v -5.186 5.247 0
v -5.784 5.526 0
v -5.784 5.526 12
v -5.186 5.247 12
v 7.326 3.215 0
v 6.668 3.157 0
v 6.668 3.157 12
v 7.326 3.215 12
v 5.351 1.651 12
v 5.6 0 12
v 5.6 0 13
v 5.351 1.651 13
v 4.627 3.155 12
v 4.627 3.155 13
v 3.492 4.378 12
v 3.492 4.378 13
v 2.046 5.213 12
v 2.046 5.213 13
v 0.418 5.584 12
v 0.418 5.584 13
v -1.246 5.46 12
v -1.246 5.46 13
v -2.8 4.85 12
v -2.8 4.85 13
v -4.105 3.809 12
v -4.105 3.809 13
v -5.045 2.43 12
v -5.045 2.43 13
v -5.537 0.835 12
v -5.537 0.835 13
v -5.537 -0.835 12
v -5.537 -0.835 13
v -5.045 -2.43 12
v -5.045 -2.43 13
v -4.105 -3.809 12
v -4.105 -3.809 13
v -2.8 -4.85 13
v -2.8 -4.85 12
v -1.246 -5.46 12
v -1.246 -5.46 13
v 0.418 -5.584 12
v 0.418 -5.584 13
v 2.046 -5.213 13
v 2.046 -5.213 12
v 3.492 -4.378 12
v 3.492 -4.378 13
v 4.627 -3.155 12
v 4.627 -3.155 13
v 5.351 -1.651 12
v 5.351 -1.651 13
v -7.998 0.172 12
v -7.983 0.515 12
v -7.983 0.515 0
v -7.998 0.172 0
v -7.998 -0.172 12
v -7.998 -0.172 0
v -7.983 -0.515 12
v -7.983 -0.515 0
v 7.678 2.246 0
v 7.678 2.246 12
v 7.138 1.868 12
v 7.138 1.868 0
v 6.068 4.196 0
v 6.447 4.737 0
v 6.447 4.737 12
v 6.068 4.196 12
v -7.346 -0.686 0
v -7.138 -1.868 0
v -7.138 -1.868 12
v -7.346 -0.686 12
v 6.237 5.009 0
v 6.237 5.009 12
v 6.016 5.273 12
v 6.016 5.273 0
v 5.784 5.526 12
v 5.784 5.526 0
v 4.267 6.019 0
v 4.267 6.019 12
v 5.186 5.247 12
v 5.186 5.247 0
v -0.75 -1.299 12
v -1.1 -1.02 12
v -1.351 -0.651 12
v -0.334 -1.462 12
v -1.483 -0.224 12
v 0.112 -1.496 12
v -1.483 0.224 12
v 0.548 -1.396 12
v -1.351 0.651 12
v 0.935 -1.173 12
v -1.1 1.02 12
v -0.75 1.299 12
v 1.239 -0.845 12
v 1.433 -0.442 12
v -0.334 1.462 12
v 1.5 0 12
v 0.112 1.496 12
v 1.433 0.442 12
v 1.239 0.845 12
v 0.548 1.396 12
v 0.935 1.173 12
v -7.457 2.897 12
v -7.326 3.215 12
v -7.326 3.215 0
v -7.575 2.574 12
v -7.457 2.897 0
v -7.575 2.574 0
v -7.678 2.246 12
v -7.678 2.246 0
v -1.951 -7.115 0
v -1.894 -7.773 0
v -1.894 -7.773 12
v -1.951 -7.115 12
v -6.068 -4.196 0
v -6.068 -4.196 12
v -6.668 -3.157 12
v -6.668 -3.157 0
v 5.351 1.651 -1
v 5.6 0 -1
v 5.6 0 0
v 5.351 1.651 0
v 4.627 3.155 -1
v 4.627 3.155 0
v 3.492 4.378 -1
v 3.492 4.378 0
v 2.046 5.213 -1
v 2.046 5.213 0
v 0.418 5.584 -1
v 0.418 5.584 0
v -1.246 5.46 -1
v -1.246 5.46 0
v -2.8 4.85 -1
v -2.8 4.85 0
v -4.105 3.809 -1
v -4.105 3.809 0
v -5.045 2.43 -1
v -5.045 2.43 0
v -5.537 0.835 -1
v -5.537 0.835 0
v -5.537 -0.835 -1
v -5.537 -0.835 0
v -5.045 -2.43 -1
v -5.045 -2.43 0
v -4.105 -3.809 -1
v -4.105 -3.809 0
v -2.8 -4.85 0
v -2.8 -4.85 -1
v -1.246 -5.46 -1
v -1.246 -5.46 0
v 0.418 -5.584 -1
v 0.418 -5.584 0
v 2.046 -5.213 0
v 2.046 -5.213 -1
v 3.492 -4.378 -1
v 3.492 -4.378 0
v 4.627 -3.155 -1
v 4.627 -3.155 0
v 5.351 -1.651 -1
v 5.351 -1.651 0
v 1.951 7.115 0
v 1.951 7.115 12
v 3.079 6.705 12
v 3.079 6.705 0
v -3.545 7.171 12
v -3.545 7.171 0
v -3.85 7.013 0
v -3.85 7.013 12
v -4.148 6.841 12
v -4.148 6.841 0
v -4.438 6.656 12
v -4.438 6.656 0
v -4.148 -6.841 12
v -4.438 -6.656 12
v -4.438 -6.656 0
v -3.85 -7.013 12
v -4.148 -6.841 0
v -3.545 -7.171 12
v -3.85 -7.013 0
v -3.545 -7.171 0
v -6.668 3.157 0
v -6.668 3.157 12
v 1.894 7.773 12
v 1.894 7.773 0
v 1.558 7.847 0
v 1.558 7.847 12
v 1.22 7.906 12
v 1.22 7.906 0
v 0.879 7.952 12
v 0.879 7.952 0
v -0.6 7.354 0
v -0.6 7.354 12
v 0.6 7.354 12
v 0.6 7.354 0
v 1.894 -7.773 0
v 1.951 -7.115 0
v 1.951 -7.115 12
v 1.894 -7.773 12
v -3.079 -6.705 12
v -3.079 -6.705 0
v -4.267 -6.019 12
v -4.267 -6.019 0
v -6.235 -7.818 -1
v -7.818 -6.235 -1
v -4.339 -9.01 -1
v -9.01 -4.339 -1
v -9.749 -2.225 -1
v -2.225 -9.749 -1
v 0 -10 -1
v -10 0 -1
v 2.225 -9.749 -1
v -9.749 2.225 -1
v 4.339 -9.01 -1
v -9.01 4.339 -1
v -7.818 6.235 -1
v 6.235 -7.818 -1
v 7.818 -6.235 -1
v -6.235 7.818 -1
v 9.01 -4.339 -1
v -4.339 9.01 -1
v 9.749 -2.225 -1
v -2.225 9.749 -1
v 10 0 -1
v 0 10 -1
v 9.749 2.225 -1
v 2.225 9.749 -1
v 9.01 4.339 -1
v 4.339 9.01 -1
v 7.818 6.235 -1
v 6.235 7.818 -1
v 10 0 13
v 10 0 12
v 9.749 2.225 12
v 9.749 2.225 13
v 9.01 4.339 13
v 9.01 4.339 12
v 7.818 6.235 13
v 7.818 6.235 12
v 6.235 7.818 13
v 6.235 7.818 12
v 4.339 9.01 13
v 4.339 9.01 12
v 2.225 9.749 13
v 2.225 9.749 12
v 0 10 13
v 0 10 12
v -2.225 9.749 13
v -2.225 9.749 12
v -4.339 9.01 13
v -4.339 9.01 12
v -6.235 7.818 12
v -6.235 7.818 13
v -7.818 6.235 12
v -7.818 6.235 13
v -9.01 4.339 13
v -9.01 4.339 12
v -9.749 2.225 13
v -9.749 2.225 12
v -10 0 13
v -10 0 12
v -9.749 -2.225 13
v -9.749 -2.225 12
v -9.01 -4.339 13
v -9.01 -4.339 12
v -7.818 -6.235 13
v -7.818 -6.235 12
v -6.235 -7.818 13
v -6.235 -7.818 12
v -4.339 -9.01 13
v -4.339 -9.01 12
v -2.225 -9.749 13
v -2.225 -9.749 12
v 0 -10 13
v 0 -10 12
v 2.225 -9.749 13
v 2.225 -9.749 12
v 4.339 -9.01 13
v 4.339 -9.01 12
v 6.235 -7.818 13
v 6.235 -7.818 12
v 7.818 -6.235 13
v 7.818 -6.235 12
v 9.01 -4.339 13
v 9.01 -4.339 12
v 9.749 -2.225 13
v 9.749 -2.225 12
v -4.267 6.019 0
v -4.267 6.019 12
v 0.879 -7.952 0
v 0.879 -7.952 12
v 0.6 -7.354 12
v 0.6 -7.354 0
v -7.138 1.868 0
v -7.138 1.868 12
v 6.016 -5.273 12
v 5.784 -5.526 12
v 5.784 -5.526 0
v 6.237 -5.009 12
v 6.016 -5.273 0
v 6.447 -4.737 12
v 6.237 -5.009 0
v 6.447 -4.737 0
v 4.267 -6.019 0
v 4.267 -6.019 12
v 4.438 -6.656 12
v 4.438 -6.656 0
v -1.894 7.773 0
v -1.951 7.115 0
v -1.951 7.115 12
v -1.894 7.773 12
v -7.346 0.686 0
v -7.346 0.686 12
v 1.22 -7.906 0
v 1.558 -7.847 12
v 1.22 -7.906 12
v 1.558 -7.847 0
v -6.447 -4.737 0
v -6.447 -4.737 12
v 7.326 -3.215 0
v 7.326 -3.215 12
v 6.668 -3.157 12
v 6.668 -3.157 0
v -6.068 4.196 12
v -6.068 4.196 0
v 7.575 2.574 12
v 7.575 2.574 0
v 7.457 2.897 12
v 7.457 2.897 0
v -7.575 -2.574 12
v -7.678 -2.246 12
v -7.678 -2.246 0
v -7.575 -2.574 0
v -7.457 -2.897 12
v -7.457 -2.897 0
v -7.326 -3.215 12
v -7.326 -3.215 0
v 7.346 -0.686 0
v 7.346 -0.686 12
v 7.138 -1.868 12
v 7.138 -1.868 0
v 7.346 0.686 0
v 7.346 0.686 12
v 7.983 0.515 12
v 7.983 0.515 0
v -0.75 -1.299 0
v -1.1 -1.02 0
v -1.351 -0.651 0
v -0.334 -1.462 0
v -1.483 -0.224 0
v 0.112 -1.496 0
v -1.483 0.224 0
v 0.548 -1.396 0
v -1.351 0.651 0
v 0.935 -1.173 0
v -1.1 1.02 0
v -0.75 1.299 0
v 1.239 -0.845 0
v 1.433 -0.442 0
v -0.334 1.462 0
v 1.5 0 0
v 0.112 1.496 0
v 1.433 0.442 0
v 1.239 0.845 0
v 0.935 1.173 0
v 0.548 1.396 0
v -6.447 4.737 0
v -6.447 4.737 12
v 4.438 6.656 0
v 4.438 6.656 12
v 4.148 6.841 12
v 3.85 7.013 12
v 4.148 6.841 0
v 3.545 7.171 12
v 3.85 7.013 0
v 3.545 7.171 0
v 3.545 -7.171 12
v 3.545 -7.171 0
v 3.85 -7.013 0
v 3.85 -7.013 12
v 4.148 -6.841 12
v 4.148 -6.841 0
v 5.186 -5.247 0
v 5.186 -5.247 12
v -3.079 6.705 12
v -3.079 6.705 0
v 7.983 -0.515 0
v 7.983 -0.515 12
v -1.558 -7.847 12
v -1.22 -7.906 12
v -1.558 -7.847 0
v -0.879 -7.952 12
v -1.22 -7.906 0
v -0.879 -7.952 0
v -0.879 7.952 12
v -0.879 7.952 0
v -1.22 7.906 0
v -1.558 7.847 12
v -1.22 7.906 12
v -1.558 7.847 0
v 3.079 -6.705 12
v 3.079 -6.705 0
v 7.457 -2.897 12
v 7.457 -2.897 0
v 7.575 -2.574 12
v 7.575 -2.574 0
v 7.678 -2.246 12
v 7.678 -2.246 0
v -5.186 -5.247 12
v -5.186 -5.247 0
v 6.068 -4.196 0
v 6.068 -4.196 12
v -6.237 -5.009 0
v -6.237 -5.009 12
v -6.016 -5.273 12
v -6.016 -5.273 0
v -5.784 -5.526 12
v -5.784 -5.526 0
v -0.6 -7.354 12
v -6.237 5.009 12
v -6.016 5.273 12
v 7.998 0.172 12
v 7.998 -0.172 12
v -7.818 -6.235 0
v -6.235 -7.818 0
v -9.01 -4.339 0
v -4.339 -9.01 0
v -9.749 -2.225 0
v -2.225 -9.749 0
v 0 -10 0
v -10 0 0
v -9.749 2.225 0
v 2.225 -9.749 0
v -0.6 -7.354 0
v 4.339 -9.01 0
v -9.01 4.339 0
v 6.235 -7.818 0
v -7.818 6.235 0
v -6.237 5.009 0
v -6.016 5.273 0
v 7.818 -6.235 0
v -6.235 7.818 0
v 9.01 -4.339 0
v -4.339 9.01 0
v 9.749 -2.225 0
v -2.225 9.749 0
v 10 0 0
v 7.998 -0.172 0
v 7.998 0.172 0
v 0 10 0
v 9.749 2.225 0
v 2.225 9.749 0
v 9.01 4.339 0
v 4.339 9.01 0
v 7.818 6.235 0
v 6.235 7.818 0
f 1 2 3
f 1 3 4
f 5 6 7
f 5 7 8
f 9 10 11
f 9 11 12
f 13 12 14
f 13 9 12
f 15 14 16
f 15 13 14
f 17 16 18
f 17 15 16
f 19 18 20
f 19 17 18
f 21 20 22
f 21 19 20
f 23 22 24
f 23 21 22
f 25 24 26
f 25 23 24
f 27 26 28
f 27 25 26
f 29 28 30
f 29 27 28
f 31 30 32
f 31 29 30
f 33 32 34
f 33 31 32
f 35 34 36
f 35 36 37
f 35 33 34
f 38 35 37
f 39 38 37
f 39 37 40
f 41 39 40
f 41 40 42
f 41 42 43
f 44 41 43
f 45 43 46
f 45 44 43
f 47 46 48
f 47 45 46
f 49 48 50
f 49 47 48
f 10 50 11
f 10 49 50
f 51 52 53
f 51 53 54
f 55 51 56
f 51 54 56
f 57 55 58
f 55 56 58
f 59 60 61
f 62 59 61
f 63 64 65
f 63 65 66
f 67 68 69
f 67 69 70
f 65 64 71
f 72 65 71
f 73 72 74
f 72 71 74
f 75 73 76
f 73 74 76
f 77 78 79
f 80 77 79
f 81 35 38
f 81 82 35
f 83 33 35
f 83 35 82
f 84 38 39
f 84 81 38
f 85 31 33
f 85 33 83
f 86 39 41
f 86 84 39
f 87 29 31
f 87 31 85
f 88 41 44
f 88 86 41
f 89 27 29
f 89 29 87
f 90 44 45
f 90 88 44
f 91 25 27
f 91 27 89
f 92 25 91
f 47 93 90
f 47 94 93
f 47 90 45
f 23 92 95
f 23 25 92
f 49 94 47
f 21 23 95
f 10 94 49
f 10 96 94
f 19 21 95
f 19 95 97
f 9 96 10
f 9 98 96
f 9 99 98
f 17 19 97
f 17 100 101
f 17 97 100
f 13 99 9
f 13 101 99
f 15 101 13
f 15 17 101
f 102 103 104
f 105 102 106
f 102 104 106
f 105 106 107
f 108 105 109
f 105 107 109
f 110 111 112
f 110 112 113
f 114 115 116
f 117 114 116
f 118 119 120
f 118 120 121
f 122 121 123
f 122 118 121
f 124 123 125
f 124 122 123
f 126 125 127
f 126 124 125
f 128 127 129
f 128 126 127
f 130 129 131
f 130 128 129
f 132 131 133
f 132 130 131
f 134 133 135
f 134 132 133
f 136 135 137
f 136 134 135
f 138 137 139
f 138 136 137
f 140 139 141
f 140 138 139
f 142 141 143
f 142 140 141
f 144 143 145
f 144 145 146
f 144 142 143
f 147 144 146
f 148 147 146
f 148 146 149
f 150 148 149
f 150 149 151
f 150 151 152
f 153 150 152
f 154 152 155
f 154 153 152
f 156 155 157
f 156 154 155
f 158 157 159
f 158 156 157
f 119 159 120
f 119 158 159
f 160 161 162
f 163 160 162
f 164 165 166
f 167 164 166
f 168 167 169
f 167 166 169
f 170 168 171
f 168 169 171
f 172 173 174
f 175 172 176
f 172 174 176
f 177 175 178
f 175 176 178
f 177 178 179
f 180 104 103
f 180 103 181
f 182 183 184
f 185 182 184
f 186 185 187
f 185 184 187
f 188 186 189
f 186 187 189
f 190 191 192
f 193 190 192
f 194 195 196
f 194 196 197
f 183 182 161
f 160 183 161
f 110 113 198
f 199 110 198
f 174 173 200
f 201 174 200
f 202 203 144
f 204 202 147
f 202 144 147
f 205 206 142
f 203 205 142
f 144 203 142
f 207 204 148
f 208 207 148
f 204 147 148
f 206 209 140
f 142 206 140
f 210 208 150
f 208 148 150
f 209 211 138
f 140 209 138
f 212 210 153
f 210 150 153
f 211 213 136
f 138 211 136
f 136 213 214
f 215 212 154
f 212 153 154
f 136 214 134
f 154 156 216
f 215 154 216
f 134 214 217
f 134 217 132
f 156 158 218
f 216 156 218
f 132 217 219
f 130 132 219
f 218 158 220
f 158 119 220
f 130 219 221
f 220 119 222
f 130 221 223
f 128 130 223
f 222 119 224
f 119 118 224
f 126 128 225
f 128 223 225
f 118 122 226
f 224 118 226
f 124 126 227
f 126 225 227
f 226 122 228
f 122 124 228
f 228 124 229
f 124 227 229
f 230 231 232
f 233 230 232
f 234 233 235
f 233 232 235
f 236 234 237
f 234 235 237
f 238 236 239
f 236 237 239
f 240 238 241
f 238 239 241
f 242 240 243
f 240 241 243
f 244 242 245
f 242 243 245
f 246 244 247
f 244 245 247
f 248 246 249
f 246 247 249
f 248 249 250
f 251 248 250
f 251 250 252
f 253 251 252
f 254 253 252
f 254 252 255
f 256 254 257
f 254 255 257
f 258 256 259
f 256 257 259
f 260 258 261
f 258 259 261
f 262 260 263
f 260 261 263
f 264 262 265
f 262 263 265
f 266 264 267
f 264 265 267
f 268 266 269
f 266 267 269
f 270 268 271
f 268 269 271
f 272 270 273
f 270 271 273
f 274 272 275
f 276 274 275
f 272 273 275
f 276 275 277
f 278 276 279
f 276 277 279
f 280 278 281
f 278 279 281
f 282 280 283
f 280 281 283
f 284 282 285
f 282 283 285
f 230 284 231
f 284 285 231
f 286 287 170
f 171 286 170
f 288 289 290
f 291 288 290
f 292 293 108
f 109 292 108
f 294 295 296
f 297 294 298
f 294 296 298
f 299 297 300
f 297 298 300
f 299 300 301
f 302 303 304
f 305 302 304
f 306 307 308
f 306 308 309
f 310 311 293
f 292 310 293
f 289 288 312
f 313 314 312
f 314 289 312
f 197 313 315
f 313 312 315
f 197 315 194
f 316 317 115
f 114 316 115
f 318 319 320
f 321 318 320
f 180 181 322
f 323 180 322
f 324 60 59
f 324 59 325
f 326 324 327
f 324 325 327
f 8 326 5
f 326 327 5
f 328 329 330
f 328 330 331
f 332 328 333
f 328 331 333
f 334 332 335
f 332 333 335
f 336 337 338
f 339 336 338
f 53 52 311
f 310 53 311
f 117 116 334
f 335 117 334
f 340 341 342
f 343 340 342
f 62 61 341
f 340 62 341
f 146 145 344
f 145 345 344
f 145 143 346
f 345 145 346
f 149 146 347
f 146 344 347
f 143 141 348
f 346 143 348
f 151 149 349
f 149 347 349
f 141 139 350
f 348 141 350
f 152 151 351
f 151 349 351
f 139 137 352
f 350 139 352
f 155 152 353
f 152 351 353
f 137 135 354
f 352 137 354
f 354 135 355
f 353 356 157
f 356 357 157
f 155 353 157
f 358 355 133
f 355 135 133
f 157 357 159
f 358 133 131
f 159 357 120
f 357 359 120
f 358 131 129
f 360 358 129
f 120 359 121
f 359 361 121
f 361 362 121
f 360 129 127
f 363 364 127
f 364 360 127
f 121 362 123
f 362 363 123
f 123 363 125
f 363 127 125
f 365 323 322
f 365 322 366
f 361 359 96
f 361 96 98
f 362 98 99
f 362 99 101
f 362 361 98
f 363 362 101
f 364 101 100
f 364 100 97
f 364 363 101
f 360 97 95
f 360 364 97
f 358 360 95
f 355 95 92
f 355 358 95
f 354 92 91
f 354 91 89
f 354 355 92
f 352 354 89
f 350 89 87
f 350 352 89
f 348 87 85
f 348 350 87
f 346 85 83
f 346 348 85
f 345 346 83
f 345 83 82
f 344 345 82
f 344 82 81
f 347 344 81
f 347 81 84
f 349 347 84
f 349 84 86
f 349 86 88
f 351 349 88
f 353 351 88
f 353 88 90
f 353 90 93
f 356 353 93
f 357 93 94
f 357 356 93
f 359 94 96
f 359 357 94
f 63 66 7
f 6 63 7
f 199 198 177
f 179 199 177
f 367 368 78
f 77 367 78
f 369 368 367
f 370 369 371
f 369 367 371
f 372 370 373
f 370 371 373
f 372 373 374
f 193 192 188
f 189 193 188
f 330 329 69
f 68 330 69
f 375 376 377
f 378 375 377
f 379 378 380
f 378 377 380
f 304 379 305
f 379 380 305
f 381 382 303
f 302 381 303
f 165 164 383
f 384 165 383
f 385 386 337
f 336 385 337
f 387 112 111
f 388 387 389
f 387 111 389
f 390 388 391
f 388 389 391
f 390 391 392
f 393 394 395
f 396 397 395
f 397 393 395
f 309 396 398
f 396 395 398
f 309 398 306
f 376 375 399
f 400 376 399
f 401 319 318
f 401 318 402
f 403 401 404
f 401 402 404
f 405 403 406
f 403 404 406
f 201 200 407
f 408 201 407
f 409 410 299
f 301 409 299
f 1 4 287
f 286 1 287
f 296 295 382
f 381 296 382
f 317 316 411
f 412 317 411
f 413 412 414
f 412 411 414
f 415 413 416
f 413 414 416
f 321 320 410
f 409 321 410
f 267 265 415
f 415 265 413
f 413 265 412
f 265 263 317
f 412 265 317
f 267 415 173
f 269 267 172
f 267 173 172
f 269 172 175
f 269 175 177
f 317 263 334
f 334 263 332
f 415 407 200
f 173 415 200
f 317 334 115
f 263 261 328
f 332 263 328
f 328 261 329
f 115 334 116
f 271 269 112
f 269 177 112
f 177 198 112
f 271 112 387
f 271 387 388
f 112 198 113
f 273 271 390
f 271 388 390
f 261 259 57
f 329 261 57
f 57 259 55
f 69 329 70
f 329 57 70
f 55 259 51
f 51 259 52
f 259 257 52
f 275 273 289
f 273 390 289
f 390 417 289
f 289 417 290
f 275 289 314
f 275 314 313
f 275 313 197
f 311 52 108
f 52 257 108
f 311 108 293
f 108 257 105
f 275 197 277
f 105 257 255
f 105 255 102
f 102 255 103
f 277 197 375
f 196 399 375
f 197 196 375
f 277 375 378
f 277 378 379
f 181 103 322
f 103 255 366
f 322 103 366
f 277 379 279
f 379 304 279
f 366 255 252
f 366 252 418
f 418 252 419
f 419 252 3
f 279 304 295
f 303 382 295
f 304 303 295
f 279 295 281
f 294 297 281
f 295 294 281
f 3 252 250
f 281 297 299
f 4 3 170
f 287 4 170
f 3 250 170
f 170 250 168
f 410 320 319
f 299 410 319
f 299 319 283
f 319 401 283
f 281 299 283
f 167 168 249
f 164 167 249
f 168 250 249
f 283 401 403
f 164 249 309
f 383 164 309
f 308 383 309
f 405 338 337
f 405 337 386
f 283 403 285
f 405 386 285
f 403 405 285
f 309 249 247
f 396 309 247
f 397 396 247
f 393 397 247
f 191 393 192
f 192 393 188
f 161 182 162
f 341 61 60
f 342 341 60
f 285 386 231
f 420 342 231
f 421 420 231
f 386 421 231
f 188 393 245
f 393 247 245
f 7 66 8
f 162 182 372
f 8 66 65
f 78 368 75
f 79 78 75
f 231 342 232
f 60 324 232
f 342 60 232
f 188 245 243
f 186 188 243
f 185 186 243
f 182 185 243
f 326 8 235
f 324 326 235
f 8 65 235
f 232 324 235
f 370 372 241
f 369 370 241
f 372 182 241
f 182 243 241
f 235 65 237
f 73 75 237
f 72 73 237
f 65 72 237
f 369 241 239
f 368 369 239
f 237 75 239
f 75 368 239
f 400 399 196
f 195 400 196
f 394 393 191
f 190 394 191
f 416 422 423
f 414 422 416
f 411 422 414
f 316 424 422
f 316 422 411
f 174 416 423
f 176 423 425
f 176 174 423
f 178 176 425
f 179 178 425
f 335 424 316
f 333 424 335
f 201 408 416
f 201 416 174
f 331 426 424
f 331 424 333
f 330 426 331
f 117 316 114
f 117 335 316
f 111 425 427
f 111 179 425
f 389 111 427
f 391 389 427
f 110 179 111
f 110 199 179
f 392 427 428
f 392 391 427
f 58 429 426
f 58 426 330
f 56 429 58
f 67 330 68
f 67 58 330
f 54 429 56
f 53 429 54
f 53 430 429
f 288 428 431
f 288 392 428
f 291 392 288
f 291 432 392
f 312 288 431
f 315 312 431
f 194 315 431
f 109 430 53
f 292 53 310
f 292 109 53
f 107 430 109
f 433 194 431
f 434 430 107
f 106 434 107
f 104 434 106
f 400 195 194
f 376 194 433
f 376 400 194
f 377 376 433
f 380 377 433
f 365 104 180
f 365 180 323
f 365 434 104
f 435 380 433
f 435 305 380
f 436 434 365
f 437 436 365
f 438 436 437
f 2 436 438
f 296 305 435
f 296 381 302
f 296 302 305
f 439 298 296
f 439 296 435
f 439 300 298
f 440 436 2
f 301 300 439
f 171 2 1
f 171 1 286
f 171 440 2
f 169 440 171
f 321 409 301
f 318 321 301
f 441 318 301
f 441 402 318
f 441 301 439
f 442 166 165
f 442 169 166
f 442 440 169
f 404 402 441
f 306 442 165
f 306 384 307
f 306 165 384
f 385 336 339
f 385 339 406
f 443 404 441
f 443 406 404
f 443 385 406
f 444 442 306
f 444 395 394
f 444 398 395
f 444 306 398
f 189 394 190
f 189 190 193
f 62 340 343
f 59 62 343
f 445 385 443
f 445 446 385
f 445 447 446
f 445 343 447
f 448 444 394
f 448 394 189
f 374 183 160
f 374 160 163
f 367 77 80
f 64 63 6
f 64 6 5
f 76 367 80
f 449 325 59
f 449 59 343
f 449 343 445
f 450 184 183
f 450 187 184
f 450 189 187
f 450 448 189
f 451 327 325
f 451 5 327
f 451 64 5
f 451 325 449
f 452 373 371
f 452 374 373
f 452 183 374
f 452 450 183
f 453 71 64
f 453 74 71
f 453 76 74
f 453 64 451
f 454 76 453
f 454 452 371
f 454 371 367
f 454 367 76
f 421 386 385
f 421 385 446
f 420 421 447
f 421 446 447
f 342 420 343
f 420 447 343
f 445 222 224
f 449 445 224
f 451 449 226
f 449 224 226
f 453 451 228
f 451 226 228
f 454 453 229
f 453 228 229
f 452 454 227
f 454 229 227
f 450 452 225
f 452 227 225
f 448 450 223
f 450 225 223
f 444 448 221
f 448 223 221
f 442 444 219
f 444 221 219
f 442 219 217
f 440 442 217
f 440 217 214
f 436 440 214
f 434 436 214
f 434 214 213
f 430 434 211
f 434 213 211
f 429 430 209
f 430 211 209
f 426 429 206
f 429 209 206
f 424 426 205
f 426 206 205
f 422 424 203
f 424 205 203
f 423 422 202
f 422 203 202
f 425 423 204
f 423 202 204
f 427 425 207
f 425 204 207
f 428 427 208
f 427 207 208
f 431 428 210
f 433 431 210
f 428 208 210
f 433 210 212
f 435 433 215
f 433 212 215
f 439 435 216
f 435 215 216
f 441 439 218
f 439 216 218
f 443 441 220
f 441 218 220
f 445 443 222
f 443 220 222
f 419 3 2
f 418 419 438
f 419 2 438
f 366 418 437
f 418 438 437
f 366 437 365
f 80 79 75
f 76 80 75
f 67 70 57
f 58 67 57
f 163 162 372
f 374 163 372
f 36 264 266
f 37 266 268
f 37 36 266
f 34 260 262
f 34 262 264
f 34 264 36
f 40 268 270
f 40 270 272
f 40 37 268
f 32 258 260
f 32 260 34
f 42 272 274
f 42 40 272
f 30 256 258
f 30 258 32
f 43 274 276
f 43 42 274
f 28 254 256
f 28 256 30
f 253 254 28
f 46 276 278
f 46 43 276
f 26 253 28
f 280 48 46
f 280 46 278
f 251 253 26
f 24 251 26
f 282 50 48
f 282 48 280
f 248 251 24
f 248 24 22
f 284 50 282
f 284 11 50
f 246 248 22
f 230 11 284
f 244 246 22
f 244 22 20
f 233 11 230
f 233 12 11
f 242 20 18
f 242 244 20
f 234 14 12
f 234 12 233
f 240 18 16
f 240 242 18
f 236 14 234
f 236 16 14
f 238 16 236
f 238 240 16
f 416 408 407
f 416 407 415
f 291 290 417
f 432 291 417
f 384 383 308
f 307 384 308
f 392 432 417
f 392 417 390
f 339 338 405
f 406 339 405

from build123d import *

# Parameters (mm, degrees)
ESQUISSE1_R                  = 8
ESQUISSE1_R_2                = 1.5
EXTRUSION1_DEPTH             = 12
EXTRUSION2_DEPTH             = 17.492422502
R_P_TITION_CIRCULAIRE1_COUNT = 18
ESQUISSE3_R                  = 10
ESQUISSE3_R_2                = 5.6
EXTRUSION3_DEPTH             = 1
R_P_TITION_LIN_AIRE1_COUNT   = 2
R_P_TITION_LIN_AIRE1_PITCH   = 13


with BuildPart() as part:
    # Esquisse1 → Extrusion1 (new body)
    with BuildSketch(Plane.XY):
        Circle(ESQUISSE1_R)
        Circle(ESQUISSE1_R_2, mode=Mode.SUBTRACT)
    extrude(amount=EXTRUSION1_DEPTH)

    # Esquisse2 → Extrusion2 (cut, through all)
    with BuildSketch(Plane.XY.offset(12)):
        Polygon((-0.6, 7.353512063), (0.6, 7.353512063), (1.002277566, 8.216199086), (-1.002277566, 8.216199086), align=None)
    extrusion2 = extrude(amount=-EXTRUSION2_DEPTH, mode=Mode.SUBTRACT)

    # Répétition circulaire1: Extrusion2 ×18 about axis
    r_p_tition_circulaire1_axis = Axis((0, 0, 0), (0, 0, 1))
    for i in range(1, R_P_TITION_CIRCULAIRE1_COUNT):
        add(extrusion2.rotate(r_p_tition_circulaire1_axis, i * 360 / R_P_TITION_CIRCULAIRE1_COUNT), mode=Mode.SUBTRACT)

    # Esquisse3 → Extrusion3 (add)
    with BuildSketch(Plane.XY.offset(12)):
        Circle(ESQUISSE3_R)
        Circle(ESQUISSE3_R_2, mode=Mode.SUBTRACT)
    extrusion3 = extrude(amount=EXTRUSION3_DEPTH)

    # Répétition linéaire1: Extrusion3 ×2
    with Locations(*[(0, 0, -i * R_P_TITION_LIN_AIRE1_PITCH) for i in range(1, R_P_TITION_LIN_AIRE1_COUNT)]):
        add(extrusion3)


solid = part.part
